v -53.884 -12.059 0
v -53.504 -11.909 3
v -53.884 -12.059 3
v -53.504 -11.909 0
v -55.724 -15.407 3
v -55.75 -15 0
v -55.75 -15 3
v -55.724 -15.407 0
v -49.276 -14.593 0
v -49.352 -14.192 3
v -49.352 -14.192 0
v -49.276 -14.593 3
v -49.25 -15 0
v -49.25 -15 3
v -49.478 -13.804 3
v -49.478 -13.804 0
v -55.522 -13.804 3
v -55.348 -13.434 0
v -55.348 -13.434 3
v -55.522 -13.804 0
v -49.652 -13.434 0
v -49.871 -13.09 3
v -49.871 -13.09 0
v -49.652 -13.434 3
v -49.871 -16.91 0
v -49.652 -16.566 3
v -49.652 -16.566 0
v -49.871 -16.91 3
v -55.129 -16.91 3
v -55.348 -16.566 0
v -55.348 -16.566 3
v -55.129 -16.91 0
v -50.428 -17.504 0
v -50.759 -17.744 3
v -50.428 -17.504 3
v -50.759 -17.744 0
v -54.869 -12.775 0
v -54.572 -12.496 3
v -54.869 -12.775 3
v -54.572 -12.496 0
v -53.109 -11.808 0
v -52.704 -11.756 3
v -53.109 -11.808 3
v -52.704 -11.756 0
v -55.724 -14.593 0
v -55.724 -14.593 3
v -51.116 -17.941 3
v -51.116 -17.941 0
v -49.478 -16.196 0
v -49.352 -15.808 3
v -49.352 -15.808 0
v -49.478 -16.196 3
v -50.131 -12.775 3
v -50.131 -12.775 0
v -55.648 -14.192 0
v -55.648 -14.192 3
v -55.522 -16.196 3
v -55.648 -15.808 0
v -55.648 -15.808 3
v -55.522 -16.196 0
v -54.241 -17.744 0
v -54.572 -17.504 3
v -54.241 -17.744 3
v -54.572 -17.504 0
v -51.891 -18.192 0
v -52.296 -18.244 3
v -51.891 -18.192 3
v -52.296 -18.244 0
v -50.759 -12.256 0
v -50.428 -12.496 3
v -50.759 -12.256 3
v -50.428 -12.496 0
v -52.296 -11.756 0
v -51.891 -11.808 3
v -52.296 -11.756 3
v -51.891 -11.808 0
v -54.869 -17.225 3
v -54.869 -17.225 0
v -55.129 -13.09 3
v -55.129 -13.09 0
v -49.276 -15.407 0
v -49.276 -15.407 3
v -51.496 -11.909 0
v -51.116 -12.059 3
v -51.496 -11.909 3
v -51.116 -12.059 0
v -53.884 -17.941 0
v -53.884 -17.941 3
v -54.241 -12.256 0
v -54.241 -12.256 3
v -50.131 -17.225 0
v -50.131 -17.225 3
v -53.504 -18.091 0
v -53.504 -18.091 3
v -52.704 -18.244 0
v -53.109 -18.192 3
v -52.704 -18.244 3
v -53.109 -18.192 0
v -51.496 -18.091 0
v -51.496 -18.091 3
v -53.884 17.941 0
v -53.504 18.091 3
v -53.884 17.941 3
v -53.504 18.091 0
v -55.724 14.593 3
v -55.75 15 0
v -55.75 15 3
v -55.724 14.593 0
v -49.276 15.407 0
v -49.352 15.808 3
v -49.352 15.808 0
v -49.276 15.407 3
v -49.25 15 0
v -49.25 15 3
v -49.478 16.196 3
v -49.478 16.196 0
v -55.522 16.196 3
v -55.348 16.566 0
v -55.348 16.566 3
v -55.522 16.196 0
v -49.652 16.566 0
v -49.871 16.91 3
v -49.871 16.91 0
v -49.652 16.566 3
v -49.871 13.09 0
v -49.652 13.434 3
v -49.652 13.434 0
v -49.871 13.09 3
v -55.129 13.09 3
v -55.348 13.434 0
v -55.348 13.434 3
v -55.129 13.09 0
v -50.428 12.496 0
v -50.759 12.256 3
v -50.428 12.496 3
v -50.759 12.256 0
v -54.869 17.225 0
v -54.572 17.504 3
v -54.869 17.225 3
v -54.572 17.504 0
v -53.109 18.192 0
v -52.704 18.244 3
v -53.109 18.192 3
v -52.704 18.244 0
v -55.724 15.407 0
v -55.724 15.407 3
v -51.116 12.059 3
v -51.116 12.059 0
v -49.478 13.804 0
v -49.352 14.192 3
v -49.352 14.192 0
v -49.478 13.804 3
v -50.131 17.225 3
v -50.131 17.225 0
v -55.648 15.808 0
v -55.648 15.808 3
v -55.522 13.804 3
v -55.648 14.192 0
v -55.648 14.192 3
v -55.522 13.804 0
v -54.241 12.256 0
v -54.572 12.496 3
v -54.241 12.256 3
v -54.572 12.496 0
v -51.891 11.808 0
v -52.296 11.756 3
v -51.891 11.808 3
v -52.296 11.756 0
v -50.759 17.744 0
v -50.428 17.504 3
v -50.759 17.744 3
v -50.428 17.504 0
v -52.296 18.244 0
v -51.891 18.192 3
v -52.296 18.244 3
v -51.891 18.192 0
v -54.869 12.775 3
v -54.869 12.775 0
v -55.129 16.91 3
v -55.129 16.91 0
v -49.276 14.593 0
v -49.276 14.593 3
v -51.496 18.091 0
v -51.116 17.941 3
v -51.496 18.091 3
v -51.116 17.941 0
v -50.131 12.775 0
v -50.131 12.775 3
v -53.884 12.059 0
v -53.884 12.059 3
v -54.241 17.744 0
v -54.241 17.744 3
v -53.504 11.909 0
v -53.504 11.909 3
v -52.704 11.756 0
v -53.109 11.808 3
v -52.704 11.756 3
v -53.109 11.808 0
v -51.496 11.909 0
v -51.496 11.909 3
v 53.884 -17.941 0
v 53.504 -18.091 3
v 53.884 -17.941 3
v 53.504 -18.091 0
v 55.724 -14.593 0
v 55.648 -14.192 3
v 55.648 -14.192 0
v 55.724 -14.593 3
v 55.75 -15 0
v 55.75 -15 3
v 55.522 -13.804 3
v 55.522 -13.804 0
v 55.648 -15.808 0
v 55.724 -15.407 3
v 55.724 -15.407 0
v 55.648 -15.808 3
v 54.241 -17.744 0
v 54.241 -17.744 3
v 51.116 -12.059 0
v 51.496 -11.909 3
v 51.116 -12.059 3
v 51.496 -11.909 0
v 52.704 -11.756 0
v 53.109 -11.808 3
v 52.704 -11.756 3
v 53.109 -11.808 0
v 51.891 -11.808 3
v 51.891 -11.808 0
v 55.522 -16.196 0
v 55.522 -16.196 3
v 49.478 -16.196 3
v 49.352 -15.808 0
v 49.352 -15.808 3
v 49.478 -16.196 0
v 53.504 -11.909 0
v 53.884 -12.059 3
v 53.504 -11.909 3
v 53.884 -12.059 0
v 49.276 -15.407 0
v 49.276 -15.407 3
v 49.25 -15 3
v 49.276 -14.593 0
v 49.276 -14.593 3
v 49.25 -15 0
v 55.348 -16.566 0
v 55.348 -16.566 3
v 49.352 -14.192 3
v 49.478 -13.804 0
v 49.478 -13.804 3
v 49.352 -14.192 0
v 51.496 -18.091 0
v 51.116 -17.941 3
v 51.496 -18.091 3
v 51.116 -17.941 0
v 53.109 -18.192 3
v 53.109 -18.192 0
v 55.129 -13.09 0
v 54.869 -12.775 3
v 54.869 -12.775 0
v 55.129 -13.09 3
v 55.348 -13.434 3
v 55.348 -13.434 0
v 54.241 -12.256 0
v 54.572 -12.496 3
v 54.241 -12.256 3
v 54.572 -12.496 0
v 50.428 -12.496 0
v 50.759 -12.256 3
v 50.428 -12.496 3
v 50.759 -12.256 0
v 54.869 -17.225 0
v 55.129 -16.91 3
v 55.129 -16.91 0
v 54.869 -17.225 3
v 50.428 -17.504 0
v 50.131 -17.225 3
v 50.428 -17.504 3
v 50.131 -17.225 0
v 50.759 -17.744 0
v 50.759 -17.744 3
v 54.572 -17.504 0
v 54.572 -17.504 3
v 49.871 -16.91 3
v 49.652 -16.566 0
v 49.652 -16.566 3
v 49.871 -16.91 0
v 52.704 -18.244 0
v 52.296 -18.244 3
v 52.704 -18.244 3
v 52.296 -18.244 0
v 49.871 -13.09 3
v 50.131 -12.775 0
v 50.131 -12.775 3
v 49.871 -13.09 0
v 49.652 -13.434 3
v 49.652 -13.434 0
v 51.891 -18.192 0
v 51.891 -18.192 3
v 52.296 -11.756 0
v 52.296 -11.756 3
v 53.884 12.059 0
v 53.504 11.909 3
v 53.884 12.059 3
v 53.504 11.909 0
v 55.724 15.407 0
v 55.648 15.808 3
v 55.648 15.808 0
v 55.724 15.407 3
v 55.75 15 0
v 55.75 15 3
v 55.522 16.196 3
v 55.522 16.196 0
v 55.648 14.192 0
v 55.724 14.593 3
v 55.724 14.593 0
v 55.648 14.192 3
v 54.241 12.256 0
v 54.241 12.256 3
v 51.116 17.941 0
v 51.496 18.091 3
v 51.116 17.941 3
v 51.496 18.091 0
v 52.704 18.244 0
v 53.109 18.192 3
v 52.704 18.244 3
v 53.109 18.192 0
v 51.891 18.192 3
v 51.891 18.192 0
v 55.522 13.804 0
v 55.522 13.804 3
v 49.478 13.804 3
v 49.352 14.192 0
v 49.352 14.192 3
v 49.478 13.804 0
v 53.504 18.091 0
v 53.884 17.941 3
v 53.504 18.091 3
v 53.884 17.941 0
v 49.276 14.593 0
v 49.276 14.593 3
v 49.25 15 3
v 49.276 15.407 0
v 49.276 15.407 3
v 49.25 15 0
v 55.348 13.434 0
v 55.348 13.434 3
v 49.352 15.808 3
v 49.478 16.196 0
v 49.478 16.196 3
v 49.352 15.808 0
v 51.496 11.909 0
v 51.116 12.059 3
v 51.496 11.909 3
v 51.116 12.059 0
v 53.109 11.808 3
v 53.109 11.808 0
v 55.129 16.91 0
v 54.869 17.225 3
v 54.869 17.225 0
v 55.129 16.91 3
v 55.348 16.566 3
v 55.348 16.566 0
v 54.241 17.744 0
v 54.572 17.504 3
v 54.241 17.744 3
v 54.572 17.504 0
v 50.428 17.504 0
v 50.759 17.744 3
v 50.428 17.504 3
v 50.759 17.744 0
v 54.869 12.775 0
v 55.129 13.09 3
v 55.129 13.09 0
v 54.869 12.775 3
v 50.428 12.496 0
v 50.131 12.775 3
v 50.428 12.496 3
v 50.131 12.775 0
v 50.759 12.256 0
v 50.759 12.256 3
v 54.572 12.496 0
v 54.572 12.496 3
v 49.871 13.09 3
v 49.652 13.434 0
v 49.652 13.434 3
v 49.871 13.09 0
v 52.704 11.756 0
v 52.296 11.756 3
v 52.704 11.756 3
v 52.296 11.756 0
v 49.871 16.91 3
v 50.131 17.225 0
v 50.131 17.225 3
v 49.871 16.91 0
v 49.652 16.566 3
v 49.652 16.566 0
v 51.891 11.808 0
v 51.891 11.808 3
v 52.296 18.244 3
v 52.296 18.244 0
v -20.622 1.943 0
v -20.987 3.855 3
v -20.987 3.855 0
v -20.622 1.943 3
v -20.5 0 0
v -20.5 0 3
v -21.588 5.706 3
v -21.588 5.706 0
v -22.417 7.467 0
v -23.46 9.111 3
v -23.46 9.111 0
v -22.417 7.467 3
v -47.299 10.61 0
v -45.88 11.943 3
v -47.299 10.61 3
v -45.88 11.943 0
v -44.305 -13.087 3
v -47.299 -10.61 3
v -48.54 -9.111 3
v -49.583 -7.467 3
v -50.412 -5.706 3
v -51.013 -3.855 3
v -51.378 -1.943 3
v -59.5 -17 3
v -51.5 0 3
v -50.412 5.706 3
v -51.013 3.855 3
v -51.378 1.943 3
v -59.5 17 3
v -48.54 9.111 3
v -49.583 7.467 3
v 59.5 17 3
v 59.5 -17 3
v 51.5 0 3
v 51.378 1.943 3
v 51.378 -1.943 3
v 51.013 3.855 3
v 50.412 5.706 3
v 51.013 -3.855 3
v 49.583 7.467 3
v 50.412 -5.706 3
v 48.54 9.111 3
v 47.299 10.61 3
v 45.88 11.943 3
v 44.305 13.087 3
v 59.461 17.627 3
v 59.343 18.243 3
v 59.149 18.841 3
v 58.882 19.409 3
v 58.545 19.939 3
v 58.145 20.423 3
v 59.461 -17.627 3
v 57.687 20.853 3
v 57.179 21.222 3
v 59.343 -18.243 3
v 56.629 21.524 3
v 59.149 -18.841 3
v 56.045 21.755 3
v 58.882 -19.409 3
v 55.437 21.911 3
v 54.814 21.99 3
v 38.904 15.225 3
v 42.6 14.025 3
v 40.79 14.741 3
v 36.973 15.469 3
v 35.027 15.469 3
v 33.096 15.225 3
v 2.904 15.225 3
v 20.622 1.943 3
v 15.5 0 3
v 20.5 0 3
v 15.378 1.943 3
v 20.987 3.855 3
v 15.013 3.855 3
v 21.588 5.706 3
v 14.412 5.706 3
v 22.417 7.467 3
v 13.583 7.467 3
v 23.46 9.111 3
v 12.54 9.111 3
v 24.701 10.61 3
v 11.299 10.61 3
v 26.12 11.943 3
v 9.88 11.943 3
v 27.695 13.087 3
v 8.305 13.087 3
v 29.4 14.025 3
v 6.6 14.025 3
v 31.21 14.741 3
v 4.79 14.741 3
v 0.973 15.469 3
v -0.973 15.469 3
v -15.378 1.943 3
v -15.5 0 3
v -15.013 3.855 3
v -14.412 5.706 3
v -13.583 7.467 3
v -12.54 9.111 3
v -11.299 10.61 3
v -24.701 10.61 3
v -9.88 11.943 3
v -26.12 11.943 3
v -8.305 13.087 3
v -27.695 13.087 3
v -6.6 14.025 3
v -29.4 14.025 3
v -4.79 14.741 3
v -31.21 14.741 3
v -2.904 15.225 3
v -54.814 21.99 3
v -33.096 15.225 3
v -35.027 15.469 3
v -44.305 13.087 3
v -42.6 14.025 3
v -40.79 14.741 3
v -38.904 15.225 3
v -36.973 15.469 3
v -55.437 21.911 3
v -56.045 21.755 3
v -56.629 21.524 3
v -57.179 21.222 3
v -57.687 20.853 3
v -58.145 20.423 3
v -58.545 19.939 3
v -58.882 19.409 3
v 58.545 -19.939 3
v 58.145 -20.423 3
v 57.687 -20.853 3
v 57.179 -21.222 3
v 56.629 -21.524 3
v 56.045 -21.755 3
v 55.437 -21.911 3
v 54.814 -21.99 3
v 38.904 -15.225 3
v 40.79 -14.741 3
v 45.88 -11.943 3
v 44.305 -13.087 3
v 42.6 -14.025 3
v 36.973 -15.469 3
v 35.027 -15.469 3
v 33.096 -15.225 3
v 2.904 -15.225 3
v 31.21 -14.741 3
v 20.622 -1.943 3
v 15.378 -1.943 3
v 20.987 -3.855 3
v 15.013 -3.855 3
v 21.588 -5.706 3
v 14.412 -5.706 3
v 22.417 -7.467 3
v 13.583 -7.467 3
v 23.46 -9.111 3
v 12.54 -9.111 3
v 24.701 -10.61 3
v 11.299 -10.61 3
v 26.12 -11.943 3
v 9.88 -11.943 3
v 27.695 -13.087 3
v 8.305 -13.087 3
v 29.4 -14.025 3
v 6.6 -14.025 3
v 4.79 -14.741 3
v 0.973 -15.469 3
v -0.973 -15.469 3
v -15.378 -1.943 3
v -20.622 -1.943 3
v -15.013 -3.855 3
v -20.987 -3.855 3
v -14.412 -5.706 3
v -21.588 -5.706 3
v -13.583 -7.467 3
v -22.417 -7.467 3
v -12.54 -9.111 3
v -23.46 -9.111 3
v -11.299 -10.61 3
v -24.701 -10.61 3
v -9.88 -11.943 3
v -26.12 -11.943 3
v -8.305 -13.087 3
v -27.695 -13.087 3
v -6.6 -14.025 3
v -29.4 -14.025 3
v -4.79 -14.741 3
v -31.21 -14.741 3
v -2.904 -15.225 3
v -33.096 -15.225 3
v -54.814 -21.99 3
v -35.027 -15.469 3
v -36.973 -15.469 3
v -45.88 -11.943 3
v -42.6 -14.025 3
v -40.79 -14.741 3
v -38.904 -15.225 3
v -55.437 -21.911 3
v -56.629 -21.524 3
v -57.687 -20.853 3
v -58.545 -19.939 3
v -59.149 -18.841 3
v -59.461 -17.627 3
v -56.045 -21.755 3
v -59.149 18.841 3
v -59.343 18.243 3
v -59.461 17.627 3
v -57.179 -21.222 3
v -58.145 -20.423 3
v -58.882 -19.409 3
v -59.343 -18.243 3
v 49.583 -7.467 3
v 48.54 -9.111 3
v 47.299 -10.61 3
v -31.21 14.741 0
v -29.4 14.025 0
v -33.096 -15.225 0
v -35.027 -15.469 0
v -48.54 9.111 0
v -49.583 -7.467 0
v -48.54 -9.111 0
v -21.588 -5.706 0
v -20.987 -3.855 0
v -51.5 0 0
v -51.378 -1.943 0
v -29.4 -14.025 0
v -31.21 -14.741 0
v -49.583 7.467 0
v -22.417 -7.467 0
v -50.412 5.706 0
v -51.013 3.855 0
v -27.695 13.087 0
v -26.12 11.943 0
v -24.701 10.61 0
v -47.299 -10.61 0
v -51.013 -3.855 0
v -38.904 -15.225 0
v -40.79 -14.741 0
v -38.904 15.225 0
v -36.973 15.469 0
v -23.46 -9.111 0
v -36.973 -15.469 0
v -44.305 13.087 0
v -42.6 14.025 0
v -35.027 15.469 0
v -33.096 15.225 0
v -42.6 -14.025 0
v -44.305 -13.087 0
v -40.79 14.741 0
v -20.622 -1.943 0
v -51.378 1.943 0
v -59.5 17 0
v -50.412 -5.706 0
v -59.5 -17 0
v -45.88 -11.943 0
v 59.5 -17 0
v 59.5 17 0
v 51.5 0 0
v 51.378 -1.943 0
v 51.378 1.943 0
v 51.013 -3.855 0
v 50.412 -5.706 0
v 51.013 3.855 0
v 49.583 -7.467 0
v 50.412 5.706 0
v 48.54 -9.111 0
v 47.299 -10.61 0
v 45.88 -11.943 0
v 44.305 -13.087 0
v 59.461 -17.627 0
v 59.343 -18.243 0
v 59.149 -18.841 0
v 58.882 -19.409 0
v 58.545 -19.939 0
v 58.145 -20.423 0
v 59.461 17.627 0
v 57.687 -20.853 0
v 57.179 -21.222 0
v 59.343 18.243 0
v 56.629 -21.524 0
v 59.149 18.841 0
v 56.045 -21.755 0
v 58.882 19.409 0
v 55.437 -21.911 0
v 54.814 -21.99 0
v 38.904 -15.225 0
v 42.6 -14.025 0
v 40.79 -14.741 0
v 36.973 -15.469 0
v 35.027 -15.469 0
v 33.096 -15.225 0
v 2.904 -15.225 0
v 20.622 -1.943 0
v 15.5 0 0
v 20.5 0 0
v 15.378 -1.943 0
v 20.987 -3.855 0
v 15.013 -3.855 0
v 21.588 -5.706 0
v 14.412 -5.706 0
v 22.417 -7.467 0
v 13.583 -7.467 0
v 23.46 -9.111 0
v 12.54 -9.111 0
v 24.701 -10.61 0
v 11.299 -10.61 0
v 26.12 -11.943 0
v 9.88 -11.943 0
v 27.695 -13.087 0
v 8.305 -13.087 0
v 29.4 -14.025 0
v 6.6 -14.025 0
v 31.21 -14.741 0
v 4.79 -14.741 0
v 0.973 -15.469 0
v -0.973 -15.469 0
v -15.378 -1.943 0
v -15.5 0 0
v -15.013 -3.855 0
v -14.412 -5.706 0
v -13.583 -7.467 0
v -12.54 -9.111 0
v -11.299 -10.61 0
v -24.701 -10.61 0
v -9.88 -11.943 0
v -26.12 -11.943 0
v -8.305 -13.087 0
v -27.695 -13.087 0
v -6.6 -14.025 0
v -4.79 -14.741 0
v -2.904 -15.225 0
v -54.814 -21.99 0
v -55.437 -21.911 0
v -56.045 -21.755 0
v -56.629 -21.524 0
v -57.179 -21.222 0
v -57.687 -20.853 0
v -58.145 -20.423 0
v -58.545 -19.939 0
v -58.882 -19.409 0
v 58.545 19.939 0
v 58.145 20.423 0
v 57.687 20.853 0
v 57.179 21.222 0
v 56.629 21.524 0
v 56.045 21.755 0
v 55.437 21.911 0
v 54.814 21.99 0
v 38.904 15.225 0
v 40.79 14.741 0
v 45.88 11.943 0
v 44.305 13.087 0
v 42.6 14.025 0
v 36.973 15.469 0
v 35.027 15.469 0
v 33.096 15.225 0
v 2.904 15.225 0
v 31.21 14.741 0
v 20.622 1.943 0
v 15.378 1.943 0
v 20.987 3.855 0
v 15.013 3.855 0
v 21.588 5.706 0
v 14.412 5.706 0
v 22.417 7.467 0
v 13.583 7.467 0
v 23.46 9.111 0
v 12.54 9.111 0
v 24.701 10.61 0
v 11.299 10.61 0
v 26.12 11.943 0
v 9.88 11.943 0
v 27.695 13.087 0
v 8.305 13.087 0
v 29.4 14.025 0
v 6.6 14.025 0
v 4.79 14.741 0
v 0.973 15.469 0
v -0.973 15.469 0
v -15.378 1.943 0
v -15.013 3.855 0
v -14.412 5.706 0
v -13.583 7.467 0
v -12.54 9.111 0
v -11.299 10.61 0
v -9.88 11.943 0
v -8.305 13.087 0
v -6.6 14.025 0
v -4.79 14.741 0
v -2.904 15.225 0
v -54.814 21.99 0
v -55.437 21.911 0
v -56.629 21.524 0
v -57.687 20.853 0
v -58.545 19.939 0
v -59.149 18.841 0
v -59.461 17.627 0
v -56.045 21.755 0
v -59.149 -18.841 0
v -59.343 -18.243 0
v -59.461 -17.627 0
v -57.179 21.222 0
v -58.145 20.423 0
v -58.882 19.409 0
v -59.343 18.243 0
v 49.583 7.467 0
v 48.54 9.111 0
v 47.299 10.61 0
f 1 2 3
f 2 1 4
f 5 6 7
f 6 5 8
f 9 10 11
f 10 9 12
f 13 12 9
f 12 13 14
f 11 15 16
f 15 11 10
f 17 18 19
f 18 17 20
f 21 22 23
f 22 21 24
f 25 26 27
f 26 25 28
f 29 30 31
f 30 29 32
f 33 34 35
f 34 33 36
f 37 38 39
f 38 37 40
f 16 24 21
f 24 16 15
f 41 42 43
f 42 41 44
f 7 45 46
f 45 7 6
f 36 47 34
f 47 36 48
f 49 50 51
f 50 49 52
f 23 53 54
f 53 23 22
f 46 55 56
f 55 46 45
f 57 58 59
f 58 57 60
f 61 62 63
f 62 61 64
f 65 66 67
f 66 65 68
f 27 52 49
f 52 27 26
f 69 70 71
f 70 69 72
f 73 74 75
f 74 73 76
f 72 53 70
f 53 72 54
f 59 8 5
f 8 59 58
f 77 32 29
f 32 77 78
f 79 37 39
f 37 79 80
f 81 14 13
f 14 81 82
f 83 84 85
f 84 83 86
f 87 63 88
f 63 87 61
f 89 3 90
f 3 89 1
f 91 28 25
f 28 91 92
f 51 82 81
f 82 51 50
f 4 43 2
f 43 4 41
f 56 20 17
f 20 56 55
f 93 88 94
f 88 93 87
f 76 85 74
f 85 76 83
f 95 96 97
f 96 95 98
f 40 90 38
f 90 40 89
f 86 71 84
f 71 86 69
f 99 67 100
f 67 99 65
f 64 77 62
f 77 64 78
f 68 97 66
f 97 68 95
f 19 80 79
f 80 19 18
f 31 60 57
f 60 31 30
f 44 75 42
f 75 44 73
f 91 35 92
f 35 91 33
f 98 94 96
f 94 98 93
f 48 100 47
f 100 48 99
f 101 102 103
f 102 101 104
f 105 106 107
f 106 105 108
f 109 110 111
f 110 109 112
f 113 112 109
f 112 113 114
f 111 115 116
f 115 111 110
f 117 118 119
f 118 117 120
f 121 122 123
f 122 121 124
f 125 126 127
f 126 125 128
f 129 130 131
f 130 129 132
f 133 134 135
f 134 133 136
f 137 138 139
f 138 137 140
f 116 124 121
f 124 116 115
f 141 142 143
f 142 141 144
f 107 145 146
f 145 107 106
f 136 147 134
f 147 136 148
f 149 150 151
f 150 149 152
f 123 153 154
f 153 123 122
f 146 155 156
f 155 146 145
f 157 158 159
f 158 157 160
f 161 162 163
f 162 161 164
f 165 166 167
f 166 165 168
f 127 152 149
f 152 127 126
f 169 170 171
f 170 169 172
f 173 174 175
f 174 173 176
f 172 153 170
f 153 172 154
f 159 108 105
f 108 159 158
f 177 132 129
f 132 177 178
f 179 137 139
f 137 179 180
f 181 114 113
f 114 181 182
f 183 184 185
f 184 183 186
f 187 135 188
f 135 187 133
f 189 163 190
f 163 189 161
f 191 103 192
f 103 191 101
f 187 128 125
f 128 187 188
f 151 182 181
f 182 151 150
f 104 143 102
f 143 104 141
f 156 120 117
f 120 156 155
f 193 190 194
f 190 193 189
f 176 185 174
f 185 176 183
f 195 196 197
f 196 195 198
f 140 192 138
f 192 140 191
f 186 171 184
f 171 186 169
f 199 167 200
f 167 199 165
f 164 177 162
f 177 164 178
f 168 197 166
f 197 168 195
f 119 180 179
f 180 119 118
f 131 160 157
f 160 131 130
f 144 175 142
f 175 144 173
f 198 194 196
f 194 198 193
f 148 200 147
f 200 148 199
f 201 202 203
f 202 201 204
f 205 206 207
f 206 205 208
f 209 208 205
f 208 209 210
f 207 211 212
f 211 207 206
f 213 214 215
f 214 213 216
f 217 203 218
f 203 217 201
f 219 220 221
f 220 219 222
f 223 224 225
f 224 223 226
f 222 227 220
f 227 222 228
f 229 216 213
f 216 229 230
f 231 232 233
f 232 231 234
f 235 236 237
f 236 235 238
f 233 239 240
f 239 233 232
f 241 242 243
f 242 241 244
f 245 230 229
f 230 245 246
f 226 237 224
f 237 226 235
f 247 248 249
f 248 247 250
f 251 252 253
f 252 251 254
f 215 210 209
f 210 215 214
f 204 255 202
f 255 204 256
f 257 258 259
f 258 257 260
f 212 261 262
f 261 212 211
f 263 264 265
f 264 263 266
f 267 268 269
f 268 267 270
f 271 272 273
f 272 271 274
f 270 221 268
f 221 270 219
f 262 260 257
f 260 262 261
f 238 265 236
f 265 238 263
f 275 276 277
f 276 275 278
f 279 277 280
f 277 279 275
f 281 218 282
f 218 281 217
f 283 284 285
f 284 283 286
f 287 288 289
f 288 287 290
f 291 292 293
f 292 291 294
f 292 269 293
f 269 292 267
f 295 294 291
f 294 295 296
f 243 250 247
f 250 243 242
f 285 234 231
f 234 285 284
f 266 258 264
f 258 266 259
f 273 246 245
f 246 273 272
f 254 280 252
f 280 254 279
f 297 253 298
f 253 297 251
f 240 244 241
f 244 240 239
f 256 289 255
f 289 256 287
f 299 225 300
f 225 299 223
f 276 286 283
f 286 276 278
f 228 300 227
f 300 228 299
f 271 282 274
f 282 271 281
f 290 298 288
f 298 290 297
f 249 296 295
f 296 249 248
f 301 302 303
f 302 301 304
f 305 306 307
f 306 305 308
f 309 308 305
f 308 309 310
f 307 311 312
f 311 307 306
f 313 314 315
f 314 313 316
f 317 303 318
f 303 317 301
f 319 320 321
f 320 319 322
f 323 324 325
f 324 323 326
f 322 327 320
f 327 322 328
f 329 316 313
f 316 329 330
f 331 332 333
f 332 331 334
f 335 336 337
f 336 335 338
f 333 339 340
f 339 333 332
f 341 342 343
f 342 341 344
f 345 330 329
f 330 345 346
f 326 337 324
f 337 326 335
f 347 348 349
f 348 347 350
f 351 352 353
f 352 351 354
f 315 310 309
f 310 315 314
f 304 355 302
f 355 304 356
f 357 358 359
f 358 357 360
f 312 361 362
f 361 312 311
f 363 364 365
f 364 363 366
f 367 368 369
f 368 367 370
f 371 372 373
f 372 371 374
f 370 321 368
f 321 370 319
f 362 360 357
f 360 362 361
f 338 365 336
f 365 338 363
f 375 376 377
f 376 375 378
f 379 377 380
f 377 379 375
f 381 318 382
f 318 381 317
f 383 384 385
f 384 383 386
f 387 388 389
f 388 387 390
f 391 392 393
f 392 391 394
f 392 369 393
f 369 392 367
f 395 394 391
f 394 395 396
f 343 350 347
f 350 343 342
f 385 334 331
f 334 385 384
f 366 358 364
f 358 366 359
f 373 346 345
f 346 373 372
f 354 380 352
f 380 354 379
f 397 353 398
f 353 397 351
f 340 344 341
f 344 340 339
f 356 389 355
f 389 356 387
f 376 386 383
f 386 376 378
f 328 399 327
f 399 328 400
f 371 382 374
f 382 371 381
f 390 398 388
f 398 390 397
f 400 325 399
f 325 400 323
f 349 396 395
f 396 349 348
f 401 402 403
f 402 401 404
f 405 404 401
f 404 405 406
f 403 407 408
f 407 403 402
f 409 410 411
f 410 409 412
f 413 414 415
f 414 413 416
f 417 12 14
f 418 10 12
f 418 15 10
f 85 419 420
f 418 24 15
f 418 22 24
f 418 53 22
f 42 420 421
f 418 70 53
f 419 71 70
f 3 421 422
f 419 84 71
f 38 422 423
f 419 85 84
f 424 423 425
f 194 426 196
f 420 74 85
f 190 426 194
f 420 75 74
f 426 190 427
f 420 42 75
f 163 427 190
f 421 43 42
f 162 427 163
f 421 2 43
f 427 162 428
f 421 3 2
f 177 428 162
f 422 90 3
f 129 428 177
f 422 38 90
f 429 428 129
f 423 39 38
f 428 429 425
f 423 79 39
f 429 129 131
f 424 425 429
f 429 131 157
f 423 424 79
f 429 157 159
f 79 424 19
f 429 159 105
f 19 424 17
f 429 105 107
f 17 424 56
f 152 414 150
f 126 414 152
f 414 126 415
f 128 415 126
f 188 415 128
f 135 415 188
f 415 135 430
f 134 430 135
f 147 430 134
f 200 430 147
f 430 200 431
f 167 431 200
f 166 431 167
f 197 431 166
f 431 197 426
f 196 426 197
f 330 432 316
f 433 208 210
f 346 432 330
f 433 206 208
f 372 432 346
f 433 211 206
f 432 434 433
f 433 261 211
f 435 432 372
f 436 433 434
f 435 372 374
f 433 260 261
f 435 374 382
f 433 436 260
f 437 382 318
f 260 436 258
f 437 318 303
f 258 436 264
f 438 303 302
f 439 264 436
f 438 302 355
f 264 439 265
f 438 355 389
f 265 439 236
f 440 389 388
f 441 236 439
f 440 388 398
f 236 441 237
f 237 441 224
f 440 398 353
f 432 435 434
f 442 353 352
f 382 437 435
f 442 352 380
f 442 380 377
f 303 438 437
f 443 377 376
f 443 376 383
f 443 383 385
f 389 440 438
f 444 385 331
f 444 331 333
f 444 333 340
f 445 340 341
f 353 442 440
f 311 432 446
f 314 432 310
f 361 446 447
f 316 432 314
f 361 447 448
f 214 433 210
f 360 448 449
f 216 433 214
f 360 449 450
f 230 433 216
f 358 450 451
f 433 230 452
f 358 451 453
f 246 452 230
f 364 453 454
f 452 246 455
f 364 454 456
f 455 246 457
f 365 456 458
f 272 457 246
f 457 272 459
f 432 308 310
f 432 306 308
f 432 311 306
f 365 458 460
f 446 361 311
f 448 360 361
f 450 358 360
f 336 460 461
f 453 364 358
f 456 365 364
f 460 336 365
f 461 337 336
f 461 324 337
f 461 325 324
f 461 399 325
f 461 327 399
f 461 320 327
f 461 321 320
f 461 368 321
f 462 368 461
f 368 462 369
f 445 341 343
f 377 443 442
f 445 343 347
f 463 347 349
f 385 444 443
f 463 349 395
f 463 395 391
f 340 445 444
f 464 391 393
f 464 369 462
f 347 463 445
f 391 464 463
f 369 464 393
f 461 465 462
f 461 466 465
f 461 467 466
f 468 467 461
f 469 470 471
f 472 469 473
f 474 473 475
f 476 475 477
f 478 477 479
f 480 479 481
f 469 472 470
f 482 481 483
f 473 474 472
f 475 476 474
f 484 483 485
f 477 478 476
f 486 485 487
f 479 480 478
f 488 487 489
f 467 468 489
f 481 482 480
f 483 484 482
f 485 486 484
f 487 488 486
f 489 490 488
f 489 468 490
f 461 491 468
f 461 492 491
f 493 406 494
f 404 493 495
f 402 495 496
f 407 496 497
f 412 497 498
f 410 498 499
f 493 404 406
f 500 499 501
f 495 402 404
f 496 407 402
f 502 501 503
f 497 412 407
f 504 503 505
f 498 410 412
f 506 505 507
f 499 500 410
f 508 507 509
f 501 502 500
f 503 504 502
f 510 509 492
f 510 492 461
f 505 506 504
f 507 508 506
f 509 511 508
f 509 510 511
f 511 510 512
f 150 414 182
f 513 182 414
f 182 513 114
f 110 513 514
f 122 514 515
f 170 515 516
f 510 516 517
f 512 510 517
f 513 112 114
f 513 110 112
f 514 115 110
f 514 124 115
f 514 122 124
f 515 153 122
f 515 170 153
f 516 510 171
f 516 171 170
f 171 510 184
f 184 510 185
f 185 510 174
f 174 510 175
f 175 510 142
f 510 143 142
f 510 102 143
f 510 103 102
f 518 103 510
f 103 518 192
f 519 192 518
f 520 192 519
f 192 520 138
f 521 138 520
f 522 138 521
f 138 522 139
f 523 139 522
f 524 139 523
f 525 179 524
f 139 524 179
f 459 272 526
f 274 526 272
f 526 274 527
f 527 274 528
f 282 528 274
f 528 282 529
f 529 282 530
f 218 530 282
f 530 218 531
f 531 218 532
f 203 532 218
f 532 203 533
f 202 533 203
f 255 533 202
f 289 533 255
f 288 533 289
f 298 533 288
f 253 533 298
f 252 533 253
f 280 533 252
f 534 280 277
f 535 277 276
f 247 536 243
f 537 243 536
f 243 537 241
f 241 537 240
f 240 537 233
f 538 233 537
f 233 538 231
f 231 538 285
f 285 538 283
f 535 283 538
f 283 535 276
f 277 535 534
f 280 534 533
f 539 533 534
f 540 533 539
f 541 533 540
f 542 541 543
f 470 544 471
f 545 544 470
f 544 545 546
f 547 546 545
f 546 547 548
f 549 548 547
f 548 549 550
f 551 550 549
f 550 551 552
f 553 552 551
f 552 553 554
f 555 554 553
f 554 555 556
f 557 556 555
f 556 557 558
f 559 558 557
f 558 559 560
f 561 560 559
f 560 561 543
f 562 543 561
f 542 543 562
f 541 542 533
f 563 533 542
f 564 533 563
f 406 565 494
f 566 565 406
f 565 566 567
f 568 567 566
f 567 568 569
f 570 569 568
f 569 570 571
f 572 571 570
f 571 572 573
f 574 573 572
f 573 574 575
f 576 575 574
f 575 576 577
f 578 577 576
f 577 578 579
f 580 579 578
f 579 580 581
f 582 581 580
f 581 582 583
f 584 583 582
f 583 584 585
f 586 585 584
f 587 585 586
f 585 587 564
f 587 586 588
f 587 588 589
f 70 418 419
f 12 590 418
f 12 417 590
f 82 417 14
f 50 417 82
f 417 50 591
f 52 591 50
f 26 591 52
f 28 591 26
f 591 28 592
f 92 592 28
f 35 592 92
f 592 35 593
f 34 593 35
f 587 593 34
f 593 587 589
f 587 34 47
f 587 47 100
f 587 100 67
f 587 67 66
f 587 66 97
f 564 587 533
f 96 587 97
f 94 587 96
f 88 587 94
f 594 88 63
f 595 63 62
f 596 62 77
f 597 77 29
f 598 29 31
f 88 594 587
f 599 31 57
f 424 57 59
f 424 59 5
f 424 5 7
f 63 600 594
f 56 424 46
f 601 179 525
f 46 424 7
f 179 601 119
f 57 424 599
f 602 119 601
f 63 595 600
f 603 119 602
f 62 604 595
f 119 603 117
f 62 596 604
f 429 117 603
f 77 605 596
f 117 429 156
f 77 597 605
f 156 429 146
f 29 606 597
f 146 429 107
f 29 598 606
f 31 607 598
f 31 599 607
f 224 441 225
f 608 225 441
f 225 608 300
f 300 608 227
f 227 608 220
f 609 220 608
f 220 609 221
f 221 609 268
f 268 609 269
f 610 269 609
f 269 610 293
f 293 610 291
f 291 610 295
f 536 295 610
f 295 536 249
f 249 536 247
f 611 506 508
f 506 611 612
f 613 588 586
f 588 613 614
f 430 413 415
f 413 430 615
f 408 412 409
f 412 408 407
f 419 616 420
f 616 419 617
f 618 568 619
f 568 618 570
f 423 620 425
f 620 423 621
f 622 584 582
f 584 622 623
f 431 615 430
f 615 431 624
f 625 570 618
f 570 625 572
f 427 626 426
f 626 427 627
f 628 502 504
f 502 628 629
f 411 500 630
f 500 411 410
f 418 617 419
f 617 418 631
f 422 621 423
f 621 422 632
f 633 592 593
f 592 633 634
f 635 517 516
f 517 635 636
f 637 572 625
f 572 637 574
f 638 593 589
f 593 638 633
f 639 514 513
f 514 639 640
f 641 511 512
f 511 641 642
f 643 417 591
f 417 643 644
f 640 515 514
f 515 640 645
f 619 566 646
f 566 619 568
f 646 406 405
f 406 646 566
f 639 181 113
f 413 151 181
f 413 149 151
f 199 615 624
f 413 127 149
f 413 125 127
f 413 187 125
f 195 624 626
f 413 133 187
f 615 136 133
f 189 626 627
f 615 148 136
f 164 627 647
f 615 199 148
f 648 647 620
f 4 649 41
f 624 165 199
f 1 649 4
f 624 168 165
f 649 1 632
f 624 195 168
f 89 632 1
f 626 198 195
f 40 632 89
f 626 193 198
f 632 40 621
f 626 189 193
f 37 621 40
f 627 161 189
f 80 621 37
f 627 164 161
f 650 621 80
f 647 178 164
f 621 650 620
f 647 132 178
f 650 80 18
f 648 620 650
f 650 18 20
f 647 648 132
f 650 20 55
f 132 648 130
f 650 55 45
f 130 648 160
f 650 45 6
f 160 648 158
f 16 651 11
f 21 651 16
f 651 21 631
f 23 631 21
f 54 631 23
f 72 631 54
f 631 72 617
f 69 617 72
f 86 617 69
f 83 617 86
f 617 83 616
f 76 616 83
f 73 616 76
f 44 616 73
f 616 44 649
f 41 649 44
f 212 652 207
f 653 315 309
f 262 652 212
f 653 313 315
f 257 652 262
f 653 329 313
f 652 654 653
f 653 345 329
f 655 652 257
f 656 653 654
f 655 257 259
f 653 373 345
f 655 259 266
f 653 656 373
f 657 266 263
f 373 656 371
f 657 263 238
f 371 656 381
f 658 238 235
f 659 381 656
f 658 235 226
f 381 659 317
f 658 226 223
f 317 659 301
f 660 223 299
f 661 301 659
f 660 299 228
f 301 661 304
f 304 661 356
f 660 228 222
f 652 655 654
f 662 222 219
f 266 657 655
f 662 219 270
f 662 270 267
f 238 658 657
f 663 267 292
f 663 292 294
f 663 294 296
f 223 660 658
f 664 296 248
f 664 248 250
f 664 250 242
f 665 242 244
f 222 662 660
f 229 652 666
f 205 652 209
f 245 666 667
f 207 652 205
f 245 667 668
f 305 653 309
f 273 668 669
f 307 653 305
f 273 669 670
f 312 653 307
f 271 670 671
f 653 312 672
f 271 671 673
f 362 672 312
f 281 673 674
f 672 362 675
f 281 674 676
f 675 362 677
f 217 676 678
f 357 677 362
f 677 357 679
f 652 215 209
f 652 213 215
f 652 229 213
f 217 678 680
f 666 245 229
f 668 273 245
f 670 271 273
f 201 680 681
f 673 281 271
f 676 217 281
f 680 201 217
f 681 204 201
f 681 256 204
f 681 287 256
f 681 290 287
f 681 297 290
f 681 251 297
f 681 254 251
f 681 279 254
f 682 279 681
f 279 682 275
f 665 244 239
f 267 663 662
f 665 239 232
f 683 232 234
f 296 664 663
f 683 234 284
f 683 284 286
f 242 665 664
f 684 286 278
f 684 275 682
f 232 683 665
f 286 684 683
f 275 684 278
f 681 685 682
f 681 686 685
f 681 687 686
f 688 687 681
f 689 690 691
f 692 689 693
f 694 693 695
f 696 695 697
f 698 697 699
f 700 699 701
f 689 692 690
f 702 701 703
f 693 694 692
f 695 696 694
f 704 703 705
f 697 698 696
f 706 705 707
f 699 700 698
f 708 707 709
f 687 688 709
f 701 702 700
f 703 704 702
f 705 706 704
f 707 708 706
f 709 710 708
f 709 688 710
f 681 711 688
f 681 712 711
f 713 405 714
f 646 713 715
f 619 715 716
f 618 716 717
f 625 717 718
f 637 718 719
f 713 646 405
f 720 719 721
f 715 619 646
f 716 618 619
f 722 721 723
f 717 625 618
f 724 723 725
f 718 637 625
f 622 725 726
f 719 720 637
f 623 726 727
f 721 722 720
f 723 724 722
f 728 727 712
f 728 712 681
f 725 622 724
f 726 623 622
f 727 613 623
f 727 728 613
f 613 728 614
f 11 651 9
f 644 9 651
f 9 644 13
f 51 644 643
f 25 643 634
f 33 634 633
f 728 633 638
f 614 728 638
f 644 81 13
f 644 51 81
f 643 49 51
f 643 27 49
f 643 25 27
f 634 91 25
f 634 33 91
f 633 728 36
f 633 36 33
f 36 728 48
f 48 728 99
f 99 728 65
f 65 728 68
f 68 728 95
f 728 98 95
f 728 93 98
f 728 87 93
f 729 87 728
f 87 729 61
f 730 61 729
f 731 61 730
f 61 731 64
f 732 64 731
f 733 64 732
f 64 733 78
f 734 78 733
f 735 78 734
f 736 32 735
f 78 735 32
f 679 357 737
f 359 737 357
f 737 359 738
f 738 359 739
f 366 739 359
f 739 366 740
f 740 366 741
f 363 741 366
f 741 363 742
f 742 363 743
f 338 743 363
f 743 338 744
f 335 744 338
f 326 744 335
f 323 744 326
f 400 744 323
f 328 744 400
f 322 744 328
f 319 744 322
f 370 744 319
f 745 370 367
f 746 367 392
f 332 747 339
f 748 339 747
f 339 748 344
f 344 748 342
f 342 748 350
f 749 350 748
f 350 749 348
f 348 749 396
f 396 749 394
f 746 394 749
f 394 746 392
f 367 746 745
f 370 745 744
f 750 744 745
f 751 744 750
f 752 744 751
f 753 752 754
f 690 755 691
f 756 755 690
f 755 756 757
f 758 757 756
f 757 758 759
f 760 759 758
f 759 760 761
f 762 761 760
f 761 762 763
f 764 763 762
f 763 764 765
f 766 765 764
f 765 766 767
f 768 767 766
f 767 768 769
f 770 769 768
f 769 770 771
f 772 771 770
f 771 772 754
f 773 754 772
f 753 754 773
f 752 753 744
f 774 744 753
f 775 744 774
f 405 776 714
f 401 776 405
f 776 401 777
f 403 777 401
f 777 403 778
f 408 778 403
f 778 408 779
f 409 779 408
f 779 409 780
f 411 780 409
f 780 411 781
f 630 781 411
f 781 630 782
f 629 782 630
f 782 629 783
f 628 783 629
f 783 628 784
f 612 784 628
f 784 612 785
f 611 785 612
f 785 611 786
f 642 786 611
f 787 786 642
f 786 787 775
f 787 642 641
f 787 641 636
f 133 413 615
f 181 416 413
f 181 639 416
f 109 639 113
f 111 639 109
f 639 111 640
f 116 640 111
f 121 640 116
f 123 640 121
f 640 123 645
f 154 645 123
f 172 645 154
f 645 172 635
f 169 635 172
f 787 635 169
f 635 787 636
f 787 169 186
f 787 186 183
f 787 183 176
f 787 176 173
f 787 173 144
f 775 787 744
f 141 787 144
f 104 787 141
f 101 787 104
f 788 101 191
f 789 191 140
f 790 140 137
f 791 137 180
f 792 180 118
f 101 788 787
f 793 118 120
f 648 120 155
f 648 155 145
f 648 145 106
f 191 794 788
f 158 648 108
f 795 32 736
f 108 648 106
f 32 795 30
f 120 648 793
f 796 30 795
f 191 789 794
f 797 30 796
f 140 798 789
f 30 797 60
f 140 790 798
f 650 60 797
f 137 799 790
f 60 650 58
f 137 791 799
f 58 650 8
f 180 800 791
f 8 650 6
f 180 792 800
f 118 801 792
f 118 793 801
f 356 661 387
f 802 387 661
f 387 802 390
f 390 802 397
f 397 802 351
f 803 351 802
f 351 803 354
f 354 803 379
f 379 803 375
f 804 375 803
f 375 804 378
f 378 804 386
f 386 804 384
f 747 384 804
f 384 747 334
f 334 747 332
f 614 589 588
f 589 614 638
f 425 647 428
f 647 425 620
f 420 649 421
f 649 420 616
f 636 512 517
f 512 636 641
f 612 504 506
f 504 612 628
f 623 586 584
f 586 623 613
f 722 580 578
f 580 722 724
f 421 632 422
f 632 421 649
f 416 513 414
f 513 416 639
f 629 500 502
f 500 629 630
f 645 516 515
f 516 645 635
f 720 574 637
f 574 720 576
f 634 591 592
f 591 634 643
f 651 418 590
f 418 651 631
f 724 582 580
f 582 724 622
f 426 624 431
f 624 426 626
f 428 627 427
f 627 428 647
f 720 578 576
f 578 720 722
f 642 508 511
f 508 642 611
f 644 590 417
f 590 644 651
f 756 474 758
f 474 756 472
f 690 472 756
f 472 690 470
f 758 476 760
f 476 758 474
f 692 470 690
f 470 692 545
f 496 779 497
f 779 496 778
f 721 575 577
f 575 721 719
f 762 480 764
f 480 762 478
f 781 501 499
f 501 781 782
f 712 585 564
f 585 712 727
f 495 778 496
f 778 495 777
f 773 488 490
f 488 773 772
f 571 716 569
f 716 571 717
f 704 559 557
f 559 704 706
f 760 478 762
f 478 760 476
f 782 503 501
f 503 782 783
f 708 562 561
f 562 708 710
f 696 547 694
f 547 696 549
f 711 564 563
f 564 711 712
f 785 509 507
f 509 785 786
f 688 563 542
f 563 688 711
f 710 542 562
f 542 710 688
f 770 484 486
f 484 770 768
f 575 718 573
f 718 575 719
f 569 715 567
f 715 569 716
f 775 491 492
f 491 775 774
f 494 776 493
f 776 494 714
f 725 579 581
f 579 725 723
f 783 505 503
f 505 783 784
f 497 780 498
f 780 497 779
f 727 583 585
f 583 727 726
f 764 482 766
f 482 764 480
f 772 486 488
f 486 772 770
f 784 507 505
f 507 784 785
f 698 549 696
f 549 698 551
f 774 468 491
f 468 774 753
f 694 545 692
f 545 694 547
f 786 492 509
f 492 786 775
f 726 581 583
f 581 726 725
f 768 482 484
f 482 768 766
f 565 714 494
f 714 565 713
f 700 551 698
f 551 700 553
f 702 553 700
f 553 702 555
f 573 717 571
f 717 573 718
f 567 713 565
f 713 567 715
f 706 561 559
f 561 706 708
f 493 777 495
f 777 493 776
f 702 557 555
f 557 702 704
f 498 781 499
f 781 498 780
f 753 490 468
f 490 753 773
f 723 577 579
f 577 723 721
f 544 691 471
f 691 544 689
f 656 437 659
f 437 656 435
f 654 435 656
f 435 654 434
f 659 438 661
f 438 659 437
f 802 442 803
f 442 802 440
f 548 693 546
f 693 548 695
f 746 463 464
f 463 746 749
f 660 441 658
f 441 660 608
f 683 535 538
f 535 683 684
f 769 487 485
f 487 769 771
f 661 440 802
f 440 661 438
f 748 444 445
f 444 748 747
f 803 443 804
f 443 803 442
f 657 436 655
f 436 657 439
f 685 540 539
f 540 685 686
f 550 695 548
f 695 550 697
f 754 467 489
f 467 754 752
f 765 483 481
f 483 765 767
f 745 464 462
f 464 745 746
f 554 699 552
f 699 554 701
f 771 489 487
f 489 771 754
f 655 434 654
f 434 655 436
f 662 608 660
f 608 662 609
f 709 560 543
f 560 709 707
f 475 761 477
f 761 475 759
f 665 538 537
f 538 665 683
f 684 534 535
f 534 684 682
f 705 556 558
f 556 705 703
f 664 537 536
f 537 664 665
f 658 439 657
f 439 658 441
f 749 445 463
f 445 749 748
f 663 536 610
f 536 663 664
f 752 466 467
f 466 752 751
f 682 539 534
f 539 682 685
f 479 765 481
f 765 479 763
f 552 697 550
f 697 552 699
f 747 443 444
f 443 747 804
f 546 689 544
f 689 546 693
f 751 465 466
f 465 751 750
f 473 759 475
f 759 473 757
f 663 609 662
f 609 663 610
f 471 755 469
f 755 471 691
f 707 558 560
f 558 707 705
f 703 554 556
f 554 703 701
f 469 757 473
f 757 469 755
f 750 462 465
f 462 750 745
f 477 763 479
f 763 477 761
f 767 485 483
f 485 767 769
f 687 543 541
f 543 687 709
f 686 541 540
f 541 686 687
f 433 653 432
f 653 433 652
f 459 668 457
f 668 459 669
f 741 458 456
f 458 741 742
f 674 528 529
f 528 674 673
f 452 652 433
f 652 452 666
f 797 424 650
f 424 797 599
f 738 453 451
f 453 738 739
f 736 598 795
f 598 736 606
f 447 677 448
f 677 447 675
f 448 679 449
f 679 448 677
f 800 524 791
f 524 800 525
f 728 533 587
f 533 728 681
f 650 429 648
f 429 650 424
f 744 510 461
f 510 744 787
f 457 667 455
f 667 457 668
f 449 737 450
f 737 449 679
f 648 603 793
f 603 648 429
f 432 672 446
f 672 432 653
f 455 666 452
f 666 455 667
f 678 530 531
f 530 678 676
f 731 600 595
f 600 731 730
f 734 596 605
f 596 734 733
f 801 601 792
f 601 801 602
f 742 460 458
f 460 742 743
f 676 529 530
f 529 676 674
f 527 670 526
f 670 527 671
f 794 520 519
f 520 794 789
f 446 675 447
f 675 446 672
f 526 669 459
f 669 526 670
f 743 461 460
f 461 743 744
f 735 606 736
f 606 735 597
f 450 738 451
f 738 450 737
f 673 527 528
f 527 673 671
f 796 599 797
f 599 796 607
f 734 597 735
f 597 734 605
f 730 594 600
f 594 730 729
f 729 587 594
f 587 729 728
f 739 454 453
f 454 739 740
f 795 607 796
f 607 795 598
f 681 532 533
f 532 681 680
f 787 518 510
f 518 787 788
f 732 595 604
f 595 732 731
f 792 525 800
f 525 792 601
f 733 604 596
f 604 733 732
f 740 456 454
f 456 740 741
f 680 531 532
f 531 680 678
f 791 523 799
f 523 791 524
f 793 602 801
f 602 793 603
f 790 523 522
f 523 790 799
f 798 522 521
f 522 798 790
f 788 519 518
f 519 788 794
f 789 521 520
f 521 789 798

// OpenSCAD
$fn = 50;


difference() {
	union() {
		hull() {
			translate(v = [-54.5000000000, 17.0000000000, 0]) {
				cylinder(h = 3, r = 5);
			}
			translate(v = [54.5000000000, 17.0000000000, 0]) {
				cylinder(h = 3, r = 5);
			}
			translate(v = [-54.5000000000, -17.0000000000, 0]) {
				cylinder(h = 3, r = 5);
			}
			translate(v = [54.5000000000, -17.0000000000, 0]) {
				cylinder(h = 3, r = 5);
			}
		}
	}
	union() {
		#translate(v = [-52.5000000000, -15.0000000000, -100.0000000000]) {
			cylinder(h = 200, r = 3.2500000000);
		}
		#translate(v = [-52.5000000000, 15.0000000000, -100.0000000000]) {
			cylinder(h = 200, r = 3.2500000000);
		}
		#translate(v = [52.5000000000, -15.0000000000, -100.0000000000]) {
			cylinder(h = 200, r = 3.2500000000);
		}
		#translate(v = [52.5000000000, 15.0000000000, -100.0000000000]) {
			cylinder(h = 200, r = 3.2500000000);
		}
		#translate(v = [-36.0000000000, 0, 0]) {
			cylinder(h = 3, r = 15.5000000000);
		}
		#cylinder(h = 3, r = 15.5000000000);
		#translate(v = [36.0000000000, 0, 0]) {
			cylinder(h = 3, r = 15.5000000000);
		}
	}
}
